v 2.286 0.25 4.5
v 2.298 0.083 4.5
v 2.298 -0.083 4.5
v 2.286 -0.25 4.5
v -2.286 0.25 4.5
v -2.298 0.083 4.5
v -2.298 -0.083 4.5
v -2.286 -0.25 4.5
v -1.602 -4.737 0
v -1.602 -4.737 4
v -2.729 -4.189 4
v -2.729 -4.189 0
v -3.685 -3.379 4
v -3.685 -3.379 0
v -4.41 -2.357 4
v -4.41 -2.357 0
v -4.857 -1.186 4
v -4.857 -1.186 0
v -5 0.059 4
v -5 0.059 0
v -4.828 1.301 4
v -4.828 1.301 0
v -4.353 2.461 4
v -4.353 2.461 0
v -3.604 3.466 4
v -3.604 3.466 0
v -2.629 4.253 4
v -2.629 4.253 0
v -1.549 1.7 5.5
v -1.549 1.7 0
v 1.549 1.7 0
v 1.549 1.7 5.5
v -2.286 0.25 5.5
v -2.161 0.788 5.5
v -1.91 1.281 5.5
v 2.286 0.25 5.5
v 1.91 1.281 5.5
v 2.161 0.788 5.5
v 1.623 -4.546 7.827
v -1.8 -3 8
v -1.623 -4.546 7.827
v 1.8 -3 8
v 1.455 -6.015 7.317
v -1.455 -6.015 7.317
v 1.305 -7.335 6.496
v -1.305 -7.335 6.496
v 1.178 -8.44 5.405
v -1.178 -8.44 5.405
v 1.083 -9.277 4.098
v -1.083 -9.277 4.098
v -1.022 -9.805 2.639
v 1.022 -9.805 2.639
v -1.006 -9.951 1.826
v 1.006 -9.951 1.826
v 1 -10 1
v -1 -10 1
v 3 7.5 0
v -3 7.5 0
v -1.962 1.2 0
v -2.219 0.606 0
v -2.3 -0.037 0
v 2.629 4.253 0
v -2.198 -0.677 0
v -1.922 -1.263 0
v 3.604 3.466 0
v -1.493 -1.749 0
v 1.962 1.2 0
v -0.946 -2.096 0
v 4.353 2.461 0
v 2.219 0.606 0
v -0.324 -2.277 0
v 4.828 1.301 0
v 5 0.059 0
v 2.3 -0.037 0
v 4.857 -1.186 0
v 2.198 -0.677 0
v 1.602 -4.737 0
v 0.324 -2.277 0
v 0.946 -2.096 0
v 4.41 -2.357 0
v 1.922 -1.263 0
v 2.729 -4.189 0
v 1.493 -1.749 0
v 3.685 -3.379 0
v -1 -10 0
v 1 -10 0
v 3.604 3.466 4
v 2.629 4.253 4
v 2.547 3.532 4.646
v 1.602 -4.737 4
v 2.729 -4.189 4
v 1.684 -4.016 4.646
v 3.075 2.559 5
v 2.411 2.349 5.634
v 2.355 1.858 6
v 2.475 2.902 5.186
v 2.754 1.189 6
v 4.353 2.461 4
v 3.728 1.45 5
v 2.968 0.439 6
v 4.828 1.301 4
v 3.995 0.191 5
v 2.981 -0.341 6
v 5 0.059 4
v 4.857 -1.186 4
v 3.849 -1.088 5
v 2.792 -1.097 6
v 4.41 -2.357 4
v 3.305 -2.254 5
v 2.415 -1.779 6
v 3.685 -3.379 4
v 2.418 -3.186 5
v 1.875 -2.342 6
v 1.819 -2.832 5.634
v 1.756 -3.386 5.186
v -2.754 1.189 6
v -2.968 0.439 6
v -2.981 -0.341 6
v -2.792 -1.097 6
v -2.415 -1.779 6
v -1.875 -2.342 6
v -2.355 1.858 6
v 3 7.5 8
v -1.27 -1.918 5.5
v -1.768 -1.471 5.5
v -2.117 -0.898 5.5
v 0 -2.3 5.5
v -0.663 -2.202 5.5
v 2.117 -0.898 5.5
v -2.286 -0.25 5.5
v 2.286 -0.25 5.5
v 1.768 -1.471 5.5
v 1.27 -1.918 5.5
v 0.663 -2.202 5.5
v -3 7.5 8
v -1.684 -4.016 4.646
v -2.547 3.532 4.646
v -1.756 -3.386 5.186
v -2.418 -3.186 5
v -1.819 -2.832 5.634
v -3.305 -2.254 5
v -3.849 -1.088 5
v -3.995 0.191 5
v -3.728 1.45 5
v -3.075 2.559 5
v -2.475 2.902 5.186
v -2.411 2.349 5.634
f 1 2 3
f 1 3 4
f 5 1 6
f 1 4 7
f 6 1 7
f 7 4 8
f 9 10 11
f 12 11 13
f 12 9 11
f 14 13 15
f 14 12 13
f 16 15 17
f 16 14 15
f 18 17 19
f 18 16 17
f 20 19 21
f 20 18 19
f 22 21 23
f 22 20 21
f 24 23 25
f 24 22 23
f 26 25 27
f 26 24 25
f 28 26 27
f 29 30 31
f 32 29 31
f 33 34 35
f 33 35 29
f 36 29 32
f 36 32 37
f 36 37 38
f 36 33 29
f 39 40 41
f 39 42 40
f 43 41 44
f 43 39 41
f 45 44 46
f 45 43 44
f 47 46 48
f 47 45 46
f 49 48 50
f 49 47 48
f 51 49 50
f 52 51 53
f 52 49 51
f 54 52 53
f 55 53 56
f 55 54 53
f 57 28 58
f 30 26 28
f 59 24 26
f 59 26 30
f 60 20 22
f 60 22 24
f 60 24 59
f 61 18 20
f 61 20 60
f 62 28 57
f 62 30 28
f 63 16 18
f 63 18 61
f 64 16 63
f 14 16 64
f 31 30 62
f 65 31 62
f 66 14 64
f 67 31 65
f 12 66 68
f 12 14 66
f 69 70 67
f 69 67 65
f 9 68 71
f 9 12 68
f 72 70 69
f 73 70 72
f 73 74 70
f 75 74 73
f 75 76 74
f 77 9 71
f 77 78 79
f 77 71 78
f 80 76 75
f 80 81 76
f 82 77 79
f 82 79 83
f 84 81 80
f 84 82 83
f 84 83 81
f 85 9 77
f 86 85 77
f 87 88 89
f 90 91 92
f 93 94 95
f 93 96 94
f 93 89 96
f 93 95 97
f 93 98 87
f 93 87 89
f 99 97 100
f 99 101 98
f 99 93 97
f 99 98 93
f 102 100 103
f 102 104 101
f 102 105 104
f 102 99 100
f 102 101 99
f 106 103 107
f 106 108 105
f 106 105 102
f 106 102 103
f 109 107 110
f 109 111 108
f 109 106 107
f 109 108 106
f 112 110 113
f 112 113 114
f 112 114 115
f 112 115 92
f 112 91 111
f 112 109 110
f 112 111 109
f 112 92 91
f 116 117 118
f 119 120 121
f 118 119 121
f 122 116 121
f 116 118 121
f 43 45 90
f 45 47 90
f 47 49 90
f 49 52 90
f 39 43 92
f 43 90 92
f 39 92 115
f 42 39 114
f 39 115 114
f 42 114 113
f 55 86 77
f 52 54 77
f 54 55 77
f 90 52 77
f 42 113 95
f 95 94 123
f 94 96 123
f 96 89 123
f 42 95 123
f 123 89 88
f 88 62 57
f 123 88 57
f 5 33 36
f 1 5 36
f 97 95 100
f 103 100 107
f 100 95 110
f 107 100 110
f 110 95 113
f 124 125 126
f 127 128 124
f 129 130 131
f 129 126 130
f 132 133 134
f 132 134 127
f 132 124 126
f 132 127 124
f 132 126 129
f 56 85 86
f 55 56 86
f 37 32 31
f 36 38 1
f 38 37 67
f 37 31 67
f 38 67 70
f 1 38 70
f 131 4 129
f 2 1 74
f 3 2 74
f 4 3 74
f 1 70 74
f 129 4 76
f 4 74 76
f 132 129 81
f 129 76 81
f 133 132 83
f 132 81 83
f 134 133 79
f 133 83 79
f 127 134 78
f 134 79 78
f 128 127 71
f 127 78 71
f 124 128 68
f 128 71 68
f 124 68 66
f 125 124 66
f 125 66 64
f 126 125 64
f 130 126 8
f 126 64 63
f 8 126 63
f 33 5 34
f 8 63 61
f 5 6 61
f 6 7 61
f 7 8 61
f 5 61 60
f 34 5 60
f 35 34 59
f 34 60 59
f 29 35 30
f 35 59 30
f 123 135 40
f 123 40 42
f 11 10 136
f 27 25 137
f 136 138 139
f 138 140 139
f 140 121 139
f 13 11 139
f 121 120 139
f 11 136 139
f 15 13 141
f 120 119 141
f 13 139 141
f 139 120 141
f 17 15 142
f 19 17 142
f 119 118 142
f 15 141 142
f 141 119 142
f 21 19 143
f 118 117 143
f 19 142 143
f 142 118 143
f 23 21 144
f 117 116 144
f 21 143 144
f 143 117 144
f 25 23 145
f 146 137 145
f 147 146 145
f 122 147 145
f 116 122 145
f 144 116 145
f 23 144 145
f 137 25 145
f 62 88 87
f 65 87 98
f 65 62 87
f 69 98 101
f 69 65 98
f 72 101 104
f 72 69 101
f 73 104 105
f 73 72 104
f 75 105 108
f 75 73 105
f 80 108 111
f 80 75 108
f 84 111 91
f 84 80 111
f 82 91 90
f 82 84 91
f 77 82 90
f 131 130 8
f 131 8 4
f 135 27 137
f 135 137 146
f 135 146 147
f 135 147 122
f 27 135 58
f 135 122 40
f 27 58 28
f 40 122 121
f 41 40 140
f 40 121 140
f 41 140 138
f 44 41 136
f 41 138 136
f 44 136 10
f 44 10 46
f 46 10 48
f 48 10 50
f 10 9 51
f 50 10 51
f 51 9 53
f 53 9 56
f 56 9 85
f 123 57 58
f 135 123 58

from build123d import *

# Parameters (mm, degrees)
PAD_DEPTH    = 8
SKETCH001_R  = 5
PAD001_DEPTH = 6
POCKET_DEPTH = 5.5
PAD002_DEPTH = 1
CHAMFER_SIZE = 2
FILLET_R     = 7


with BuildPart() as part:
    # Sketch → Pad (new body)
    with BuildSketch(Plane.XY):
        Polygon((1, -10), (3, 7.5), (0, 7.5), (-3, 7.5), (-1, -10), (0, -10), align=None)
    extrude(amount=PAD_DEPTH)

    # Sketch001 (on Face2 of Pad) → Pad001 (join)
    with BuildSketch(Plane(origin=(0, 0, 0), x_dir=(1, 0, 0), z_dir=(0, 0, -1))):
        Circle(SKETCH001_R)
    extrude(amount=-PAD001_DEPTH)

    # Sketch002 (on Face9 of Pad001) → Pocket (cut)
    with BuildSketch(Plane(origin=(0, 0, 0), x_dir=(1, 0, 0), z_dir=(0, 0, -1))):
        with BuildLine():
            Line((-1.549193, -1.7), (1.549193, -1.7))
            ThreePointArc((1.549193, -1.7), (0, 2.3), (-1.549193, -1.7))
        make_face()
    extrude(amount=-POCKET_DEPTH, mode=Mode.SUBTRACT)

    # Sketch003 (on Face13 of Pocket) → Pad002 (join)
    with BuildSketch(Plane(origin=(0, 0, 5.5), x_dir=(1, 0, 0), z_dir=(0, 0, -1))):
        with BuildLine():
            Line((-2.286373, 0.25), (2.286373, 0.25))
            ThreePointArc((2.286373, -0.25), (2.313709, 0), (2.286373, 0.25))
            Line((-2.286373, -0.25), (2.286373, -0.25))
            ThreePointArc((-2.286373, 0.25), (-2.3, 0), (-2.286373, -0.25))
        make_face()
    extrude(amount=PAD002_DEPTH)

    # Chamfer
    chamfer_edges = [part.edges().sort_by_distance(p)[0] for p in [
        (4.062492, -2.914818, 6),
        (4.367186, 2.434685, 6),
        (-4.967663, -0.567733, 6),
    ]]
    chamfer(chamfer_edges, length=CHAMFER_SIZE)

    # Fillet
    fillet_edges = [part.edges().sort_by_distance(p)[0] for p in [
        (0, -10, 8),
    ]]
    fillet(fillet_edges, radius=FILLET_R)


solid = part.part
